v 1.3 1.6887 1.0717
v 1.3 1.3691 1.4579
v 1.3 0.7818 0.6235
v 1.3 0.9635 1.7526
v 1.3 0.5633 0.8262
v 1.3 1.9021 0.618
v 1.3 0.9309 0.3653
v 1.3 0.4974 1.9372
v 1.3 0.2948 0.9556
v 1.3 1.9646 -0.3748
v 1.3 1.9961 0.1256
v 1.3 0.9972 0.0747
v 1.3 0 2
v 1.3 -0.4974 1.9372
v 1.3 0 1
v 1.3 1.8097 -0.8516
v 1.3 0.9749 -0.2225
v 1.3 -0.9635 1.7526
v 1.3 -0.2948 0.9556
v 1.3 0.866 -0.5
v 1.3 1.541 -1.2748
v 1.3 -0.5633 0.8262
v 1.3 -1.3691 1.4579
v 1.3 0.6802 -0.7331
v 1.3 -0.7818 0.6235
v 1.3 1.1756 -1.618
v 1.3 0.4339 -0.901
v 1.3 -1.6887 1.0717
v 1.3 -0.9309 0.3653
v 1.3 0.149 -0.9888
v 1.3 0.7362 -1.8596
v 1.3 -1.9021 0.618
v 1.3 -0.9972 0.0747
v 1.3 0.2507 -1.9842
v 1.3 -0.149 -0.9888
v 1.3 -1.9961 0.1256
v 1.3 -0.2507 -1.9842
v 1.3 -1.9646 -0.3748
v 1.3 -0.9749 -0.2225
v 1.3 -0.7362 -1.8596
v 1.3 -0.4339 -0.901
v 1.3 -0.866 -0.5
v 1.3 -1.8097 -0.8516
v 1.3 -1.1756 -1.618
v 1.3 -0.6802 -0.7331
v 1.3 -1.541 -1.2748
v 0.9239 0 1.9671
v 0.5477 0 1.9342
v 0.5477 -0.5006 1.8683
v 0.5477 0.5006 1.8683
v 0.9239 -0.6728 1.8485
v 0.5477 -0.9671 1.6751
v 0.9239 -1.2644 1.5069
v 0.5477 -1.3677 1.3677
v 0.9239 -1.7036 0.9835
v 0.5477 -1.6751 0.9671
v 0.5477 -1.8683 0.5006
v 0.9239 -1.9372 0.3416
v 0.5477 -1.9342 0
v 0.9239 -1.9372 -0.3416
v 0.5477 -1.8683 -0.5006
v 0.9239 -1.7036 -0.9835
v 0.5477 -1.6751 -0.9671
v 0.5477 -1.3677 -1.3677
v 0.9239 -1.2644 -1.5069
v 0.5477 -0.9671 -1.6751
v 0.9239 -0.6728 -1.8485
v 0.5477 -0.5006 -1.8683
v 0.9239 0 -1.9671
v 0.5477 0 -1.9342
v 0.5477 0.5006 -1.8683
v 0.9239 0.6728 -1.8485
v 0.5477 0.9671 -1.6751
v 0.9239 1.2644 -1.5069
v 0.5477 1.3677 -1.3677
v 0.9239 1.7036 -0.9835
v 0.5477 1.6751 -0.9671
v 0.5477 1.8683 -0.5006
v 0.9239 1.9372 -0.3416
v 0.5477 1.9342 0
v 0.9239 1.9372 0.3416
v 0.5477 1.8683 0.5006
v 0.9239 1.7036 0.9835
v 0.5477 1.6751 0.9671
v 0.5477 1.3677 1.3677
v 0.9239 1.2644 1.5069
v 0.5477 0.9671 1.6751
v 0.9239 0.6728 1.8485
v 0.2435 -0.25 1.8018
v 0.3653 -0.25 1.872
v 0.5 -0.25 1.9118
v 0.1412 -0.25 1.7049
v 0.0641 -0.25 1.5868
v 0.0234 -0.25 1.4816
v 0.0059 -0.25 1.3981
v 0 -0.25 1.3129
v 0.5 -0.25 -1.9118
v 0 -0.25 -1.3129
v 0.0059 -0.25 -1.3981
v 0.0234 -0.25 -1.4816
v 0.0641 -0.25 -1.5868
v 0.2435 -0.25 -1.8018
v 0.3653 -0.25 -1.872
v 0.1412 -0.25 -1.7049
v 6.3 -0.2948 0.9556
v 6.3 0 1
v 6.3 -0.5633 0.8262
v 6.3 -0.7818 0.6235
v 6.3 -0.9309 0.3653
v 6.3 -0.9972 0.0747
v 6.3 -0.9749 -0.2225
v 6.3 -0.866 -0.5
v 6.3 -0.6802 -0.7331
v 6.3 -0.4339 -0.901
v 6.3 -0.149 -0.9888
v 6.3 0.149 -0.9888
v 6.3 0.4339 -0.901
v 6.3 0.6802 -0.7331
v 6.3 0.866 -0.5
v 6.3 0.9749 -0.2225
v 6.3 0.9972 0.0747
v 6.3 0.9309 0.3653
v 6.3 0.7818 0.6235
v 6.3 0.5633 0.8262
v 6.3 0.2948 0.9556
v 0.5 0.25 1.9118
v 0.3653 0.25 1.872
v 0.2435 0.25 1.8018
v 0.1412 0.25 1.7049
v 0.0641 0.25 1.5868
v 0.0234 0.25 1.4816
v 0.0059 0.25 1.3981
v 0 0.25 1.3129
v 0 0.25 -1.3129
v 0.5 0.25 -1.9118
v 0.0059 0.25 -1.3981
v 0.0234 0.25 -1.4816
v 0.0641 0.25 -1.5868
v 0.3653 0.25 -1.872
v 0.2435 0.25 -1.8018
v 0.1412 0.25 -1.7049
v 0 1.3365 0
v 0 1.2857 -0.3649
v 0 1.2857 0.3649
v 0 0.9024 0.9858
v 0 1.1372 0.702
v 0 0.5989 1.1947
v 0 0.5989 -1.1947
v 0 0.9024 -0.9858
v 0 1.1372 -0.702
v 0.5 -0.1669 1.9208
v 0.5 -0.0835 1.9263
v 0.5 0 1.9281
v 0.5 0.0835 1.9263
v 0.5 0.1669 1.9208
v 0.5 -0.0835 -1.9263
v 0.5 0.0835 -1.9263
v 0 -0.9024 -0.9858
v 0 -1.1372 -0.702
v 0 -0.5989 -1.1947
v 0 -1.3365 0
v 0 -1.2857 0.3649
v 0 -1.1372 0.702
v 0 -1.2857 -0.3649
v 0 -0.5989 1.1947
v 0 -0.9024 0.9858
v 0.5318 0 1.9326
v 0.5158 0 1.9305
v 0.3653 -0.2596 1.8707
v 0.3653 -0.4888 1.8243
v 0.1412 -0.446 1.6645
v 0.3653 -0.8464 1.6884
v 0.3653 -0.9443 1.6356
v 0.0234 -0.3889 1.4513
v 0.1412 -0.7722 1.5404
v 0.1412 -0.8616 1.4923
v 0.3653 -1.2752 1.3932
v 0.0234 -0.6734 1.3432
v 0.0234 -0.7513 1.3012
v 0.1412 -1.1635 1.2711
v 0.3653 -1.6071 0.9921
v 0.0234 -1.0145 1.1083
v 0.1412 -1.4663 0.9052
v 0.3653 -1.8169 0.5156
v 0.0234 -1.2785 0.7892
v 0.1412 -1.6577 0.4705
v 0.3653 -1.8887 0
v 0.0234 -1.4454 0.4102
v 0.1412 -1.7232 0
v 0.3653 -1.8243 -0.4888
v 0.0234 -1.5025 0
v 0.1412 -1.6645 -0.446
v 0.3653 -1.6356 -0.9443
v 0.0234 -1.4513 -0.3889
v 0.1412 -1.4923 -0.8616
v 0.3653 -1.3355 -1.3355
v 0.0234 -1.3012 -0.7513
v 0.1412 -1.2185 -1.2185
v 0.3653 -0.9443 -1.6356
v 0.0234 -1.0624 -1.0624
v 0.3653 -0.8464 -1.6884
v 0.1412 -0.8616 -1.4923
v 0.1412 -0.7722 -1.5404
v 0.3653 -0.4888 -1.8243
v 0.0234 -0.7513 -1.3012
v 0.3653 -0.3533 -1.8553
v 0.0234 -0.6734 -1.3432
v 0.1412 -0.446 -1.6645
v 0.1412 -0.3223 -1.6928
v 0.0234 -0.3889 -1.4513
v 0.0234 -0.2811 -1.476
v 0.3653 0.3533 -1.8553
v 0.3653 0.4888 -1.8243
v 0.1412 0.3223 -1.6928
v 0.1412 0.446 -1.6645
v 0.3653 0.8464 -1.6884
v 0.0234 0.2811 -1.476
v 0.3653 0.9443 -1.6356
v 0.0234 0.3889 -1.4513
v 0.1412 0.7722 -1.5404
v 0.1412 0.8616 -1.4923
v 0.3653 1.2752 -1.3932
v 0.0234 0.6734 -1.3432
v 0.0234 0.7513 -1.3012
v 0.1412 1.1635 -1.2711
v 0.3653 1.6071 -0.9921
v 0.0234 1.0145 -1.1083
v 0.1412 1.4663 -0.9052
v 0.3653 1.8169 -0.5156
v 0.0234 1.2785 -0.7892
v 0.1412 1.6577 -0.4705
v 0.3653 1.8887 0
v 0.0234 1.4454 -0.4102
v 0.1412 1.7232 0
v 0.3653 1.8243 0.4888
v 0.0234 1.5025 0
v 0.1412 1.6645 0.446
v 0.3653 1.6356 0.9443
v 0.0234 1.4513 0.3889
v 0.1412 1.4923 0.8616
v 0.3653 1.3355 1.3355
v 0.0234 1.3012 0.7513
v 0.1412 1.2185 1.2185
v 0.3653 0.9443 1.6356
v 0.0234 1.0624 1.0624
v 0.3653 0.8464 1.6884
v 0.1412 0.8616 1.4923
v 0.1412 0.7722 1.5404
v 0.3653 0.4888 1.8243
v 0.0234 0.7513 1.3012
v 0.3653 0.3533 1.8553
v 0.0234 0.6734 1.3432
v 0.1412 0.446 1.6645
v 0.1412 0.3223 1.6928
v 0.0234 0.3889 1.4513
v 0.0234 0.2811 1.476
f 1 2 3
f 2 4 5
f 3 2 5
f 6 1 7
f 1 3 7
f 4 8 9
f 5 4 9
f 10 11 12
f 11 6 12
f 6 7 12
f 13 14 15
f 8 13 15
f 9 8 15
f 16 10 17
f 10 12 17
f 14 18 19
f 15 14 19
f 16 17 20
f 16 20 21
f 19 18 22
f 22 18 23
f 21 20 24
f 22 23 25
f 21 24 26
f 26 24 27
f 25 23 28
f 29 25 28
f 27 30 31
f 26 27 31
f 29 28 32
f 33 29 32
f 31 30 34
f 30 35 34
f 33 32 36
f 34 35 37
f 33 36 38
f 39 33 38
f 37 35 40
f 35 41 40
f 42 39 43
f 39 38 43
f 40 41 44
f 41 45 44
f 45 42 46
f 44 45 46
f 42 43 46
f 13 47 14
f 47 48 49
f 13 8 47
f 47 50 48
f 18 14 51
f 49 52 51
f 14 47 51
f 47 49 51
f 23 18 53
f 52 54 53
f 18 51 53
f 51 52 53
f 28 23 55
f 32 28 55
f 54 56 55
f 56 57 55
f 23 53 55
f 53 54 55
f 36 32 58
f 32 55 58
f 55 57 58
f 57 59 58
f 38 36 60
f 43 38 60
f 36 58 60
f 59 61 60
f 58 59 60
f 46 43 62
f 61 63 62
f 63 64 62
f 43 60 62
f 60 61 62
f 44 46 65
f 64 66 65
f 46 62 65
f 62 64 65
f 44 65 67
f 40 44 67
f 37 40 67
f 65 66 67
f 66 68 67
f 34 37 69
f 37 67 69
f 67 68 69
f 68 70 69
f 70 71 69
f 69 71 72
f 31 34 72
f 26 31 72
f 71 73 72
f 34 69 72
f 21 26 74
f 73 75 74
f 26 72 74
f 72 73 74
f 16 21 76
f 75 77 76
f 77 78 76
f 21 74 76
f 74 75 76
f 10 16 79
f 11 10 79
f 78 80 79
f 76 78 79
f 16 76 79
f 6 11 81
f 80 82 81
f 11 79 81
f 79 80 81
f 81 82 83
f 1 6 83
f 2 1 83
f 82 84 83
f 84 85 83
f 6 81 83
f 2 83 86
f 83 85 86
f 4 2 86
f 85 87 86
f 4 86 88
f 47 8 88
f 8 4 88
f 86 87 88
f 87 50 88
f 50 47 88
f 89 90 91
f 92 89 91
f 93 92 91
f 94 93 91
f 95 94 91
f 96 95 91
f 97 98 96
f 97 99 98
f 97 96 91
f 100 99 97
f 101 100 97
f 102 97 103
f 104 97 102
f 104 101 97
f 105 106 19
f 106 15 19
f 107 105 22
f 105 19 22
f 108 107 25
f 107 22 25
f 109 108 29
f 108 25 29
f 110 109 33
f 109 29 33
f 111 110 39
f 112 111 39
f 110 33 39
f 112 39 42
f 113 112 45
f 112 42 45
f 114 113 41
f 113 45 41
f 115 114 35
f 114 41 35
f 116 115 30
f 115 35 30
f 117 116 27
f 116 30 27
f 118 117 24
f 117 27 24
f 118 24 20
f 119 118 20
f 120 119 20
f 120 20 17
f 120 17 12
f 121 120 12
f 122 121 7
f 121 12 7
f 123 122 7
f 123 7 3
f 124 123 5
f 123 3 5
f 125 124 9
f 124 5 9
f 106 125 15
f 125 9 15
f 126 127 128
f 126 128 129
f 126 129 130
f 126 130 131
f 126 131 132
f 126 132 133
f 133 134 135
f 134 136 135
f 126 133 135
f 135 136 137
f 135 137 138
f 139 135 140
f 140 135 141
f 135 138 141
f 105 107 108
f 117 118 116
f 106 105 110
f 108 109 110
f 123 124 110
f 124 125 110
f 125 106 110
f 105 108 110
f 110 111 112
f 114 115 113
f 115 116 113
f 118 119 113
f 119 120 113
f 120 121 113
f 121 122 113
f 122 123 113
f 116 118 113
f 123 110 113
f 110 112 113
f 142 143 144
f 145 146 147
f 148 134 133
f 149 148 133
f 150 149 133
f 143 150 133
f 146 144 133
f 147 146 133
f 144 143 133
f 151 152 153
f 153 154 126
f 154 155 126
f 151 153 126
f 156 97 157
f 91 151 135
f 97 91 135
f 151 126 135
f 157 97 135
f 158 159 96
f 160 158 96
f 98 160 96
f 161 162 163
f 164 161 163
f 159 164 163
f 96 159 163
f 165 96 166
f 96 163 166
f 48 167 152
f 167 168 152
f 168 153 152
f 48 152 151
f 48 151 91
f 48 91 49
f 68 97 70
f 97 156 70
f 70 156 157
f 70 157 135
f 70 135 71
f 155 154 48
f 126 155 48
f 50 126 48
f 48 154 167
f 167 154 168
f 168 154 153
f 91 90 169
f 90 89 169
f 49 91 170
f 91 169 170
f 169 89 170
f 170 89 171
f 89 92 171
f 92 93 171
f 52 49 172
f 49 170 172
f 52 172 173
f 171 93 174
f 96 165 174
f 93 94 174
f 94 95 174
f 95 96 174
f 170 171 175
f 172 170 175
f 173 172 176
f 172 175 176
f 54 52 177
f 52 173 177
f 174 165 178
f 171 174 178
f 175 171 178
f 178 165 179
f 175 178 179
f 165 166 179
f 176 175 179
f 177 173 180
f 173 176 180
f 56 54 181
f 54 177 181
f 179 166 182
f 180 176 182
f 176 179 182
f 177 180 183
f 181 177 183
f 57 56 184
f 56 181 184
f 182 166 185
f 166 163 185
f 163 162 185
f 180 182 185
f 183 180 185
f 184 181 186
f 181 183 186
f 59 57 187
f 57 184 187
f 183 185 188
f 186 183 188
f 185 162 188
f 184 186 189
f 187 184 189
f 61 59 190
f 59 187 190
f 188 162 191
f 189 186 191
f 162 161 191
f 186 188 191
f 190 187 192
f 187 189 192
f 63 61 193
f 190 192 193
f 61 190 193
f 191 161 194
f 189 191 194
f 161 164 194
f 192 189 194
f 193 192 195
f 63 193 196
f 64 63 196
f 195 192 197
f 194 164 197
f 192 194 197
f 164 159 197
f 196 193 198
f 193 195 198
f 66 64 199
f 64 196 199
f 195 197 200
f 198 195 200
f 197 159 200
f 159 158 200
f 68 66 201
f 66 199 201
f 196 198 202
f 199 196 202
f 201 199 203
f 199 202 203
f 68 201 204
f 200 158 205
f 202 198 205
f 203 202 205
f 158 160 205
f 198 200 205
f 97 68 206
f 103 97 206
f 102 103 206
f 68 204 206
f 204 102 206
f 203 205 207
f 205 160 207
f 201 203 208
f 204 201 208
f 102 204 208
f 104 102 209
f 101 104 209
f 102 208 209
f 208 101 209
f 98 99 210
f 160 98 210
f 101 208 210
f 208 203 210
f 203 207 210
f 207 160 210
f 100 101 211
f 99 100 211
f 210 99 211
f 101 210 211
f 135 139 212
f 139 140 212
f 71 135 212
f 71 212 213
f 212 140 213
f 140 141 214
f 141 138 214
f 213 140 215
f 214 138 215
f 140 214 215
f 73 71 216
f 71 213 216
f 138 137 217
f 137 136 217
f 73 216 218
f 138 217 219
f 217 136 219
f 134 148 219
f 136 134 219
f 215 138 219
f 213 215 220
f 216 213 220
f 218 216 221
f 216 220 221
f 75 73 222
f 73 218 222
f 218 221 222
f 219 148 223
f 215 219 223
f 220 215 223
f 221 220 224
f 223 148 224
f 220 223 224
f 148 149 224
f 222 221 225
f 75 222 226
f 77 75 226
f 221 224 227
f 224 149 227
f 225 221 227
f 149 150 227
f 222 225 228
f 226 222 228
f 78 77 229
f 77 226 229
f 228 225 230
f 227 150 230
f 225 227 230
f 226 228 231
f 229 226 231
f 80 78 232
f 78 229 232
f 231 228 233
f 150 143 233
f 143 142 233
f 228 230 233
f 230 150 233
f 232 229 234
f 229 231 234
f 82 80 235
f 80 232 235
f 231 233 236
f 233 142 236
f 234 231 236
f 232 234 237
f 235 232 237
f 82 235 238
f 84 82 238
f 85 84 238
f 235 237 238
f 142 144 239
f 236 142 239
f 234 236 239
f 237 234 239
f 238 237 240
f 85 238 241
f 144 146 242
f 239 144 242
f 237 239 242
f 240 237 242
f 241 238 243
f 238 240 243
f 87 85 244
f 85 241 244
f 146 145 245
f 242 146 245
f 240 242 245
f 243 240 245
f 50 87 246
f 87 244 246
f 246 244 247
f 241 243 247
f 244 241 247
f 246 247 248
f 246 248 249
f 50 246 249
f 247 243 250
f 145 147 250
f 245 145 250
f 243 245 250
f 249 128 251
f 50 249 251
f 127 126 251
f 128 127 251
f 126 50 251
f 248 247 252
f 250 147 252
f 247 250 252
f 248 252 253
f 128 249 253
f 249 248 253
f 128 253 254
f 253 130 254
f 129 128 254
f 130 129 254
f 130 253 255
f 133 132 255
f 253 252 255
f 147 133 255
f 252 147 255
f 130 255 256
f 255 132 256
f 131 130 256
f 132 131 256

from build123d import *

# Parameters (mm, degrees)
FILLET2_R  = 0.6
SKETCH2_W  = 4
SKETCH2_H  = 0.5
SLOT_DEPTH = 0.5


with BuildPart() as part:
    # BodySke → Base-Revolve (revolve)
    with BuildSketch(Plane.XY, mode=Mode.PRIVATE) as base_revolve_sk:
        Polygon((1.3, 1), (1.3, 2), (0, 1.886264737), (0, 0), (6.3, 0), (6.3, 1), align=None)
    revolve(base_revolve_sk.sketch.rotate(Axis((-25.4, 0, 0), (1, 0, 0)), 90), axis=Axis((-25.4, 0, 0), (1, 0, 0)))  # turned: the seam where the file's is

    # Fillet2
    fillet2_edges = [part.edges().sort_by_distance(p)[0] for p in [
        (0, 0, -1.886264737),
    ]]
    fillet(fillet2_edges, radius=FILLET2_R)

    # Sketch2 → Slot (cut)
    with BuildSketch(Plane(origin=(0, 0, 0), x_dir=(0, 0, -1), z_dir=(1, 0, 0))):
        Rectangle(SKETCH2_W, SKETCH2_H)
    extrude(amount=SLOT_DEPTH, mode=Mode.SUBTRACT)


solid = part.part
